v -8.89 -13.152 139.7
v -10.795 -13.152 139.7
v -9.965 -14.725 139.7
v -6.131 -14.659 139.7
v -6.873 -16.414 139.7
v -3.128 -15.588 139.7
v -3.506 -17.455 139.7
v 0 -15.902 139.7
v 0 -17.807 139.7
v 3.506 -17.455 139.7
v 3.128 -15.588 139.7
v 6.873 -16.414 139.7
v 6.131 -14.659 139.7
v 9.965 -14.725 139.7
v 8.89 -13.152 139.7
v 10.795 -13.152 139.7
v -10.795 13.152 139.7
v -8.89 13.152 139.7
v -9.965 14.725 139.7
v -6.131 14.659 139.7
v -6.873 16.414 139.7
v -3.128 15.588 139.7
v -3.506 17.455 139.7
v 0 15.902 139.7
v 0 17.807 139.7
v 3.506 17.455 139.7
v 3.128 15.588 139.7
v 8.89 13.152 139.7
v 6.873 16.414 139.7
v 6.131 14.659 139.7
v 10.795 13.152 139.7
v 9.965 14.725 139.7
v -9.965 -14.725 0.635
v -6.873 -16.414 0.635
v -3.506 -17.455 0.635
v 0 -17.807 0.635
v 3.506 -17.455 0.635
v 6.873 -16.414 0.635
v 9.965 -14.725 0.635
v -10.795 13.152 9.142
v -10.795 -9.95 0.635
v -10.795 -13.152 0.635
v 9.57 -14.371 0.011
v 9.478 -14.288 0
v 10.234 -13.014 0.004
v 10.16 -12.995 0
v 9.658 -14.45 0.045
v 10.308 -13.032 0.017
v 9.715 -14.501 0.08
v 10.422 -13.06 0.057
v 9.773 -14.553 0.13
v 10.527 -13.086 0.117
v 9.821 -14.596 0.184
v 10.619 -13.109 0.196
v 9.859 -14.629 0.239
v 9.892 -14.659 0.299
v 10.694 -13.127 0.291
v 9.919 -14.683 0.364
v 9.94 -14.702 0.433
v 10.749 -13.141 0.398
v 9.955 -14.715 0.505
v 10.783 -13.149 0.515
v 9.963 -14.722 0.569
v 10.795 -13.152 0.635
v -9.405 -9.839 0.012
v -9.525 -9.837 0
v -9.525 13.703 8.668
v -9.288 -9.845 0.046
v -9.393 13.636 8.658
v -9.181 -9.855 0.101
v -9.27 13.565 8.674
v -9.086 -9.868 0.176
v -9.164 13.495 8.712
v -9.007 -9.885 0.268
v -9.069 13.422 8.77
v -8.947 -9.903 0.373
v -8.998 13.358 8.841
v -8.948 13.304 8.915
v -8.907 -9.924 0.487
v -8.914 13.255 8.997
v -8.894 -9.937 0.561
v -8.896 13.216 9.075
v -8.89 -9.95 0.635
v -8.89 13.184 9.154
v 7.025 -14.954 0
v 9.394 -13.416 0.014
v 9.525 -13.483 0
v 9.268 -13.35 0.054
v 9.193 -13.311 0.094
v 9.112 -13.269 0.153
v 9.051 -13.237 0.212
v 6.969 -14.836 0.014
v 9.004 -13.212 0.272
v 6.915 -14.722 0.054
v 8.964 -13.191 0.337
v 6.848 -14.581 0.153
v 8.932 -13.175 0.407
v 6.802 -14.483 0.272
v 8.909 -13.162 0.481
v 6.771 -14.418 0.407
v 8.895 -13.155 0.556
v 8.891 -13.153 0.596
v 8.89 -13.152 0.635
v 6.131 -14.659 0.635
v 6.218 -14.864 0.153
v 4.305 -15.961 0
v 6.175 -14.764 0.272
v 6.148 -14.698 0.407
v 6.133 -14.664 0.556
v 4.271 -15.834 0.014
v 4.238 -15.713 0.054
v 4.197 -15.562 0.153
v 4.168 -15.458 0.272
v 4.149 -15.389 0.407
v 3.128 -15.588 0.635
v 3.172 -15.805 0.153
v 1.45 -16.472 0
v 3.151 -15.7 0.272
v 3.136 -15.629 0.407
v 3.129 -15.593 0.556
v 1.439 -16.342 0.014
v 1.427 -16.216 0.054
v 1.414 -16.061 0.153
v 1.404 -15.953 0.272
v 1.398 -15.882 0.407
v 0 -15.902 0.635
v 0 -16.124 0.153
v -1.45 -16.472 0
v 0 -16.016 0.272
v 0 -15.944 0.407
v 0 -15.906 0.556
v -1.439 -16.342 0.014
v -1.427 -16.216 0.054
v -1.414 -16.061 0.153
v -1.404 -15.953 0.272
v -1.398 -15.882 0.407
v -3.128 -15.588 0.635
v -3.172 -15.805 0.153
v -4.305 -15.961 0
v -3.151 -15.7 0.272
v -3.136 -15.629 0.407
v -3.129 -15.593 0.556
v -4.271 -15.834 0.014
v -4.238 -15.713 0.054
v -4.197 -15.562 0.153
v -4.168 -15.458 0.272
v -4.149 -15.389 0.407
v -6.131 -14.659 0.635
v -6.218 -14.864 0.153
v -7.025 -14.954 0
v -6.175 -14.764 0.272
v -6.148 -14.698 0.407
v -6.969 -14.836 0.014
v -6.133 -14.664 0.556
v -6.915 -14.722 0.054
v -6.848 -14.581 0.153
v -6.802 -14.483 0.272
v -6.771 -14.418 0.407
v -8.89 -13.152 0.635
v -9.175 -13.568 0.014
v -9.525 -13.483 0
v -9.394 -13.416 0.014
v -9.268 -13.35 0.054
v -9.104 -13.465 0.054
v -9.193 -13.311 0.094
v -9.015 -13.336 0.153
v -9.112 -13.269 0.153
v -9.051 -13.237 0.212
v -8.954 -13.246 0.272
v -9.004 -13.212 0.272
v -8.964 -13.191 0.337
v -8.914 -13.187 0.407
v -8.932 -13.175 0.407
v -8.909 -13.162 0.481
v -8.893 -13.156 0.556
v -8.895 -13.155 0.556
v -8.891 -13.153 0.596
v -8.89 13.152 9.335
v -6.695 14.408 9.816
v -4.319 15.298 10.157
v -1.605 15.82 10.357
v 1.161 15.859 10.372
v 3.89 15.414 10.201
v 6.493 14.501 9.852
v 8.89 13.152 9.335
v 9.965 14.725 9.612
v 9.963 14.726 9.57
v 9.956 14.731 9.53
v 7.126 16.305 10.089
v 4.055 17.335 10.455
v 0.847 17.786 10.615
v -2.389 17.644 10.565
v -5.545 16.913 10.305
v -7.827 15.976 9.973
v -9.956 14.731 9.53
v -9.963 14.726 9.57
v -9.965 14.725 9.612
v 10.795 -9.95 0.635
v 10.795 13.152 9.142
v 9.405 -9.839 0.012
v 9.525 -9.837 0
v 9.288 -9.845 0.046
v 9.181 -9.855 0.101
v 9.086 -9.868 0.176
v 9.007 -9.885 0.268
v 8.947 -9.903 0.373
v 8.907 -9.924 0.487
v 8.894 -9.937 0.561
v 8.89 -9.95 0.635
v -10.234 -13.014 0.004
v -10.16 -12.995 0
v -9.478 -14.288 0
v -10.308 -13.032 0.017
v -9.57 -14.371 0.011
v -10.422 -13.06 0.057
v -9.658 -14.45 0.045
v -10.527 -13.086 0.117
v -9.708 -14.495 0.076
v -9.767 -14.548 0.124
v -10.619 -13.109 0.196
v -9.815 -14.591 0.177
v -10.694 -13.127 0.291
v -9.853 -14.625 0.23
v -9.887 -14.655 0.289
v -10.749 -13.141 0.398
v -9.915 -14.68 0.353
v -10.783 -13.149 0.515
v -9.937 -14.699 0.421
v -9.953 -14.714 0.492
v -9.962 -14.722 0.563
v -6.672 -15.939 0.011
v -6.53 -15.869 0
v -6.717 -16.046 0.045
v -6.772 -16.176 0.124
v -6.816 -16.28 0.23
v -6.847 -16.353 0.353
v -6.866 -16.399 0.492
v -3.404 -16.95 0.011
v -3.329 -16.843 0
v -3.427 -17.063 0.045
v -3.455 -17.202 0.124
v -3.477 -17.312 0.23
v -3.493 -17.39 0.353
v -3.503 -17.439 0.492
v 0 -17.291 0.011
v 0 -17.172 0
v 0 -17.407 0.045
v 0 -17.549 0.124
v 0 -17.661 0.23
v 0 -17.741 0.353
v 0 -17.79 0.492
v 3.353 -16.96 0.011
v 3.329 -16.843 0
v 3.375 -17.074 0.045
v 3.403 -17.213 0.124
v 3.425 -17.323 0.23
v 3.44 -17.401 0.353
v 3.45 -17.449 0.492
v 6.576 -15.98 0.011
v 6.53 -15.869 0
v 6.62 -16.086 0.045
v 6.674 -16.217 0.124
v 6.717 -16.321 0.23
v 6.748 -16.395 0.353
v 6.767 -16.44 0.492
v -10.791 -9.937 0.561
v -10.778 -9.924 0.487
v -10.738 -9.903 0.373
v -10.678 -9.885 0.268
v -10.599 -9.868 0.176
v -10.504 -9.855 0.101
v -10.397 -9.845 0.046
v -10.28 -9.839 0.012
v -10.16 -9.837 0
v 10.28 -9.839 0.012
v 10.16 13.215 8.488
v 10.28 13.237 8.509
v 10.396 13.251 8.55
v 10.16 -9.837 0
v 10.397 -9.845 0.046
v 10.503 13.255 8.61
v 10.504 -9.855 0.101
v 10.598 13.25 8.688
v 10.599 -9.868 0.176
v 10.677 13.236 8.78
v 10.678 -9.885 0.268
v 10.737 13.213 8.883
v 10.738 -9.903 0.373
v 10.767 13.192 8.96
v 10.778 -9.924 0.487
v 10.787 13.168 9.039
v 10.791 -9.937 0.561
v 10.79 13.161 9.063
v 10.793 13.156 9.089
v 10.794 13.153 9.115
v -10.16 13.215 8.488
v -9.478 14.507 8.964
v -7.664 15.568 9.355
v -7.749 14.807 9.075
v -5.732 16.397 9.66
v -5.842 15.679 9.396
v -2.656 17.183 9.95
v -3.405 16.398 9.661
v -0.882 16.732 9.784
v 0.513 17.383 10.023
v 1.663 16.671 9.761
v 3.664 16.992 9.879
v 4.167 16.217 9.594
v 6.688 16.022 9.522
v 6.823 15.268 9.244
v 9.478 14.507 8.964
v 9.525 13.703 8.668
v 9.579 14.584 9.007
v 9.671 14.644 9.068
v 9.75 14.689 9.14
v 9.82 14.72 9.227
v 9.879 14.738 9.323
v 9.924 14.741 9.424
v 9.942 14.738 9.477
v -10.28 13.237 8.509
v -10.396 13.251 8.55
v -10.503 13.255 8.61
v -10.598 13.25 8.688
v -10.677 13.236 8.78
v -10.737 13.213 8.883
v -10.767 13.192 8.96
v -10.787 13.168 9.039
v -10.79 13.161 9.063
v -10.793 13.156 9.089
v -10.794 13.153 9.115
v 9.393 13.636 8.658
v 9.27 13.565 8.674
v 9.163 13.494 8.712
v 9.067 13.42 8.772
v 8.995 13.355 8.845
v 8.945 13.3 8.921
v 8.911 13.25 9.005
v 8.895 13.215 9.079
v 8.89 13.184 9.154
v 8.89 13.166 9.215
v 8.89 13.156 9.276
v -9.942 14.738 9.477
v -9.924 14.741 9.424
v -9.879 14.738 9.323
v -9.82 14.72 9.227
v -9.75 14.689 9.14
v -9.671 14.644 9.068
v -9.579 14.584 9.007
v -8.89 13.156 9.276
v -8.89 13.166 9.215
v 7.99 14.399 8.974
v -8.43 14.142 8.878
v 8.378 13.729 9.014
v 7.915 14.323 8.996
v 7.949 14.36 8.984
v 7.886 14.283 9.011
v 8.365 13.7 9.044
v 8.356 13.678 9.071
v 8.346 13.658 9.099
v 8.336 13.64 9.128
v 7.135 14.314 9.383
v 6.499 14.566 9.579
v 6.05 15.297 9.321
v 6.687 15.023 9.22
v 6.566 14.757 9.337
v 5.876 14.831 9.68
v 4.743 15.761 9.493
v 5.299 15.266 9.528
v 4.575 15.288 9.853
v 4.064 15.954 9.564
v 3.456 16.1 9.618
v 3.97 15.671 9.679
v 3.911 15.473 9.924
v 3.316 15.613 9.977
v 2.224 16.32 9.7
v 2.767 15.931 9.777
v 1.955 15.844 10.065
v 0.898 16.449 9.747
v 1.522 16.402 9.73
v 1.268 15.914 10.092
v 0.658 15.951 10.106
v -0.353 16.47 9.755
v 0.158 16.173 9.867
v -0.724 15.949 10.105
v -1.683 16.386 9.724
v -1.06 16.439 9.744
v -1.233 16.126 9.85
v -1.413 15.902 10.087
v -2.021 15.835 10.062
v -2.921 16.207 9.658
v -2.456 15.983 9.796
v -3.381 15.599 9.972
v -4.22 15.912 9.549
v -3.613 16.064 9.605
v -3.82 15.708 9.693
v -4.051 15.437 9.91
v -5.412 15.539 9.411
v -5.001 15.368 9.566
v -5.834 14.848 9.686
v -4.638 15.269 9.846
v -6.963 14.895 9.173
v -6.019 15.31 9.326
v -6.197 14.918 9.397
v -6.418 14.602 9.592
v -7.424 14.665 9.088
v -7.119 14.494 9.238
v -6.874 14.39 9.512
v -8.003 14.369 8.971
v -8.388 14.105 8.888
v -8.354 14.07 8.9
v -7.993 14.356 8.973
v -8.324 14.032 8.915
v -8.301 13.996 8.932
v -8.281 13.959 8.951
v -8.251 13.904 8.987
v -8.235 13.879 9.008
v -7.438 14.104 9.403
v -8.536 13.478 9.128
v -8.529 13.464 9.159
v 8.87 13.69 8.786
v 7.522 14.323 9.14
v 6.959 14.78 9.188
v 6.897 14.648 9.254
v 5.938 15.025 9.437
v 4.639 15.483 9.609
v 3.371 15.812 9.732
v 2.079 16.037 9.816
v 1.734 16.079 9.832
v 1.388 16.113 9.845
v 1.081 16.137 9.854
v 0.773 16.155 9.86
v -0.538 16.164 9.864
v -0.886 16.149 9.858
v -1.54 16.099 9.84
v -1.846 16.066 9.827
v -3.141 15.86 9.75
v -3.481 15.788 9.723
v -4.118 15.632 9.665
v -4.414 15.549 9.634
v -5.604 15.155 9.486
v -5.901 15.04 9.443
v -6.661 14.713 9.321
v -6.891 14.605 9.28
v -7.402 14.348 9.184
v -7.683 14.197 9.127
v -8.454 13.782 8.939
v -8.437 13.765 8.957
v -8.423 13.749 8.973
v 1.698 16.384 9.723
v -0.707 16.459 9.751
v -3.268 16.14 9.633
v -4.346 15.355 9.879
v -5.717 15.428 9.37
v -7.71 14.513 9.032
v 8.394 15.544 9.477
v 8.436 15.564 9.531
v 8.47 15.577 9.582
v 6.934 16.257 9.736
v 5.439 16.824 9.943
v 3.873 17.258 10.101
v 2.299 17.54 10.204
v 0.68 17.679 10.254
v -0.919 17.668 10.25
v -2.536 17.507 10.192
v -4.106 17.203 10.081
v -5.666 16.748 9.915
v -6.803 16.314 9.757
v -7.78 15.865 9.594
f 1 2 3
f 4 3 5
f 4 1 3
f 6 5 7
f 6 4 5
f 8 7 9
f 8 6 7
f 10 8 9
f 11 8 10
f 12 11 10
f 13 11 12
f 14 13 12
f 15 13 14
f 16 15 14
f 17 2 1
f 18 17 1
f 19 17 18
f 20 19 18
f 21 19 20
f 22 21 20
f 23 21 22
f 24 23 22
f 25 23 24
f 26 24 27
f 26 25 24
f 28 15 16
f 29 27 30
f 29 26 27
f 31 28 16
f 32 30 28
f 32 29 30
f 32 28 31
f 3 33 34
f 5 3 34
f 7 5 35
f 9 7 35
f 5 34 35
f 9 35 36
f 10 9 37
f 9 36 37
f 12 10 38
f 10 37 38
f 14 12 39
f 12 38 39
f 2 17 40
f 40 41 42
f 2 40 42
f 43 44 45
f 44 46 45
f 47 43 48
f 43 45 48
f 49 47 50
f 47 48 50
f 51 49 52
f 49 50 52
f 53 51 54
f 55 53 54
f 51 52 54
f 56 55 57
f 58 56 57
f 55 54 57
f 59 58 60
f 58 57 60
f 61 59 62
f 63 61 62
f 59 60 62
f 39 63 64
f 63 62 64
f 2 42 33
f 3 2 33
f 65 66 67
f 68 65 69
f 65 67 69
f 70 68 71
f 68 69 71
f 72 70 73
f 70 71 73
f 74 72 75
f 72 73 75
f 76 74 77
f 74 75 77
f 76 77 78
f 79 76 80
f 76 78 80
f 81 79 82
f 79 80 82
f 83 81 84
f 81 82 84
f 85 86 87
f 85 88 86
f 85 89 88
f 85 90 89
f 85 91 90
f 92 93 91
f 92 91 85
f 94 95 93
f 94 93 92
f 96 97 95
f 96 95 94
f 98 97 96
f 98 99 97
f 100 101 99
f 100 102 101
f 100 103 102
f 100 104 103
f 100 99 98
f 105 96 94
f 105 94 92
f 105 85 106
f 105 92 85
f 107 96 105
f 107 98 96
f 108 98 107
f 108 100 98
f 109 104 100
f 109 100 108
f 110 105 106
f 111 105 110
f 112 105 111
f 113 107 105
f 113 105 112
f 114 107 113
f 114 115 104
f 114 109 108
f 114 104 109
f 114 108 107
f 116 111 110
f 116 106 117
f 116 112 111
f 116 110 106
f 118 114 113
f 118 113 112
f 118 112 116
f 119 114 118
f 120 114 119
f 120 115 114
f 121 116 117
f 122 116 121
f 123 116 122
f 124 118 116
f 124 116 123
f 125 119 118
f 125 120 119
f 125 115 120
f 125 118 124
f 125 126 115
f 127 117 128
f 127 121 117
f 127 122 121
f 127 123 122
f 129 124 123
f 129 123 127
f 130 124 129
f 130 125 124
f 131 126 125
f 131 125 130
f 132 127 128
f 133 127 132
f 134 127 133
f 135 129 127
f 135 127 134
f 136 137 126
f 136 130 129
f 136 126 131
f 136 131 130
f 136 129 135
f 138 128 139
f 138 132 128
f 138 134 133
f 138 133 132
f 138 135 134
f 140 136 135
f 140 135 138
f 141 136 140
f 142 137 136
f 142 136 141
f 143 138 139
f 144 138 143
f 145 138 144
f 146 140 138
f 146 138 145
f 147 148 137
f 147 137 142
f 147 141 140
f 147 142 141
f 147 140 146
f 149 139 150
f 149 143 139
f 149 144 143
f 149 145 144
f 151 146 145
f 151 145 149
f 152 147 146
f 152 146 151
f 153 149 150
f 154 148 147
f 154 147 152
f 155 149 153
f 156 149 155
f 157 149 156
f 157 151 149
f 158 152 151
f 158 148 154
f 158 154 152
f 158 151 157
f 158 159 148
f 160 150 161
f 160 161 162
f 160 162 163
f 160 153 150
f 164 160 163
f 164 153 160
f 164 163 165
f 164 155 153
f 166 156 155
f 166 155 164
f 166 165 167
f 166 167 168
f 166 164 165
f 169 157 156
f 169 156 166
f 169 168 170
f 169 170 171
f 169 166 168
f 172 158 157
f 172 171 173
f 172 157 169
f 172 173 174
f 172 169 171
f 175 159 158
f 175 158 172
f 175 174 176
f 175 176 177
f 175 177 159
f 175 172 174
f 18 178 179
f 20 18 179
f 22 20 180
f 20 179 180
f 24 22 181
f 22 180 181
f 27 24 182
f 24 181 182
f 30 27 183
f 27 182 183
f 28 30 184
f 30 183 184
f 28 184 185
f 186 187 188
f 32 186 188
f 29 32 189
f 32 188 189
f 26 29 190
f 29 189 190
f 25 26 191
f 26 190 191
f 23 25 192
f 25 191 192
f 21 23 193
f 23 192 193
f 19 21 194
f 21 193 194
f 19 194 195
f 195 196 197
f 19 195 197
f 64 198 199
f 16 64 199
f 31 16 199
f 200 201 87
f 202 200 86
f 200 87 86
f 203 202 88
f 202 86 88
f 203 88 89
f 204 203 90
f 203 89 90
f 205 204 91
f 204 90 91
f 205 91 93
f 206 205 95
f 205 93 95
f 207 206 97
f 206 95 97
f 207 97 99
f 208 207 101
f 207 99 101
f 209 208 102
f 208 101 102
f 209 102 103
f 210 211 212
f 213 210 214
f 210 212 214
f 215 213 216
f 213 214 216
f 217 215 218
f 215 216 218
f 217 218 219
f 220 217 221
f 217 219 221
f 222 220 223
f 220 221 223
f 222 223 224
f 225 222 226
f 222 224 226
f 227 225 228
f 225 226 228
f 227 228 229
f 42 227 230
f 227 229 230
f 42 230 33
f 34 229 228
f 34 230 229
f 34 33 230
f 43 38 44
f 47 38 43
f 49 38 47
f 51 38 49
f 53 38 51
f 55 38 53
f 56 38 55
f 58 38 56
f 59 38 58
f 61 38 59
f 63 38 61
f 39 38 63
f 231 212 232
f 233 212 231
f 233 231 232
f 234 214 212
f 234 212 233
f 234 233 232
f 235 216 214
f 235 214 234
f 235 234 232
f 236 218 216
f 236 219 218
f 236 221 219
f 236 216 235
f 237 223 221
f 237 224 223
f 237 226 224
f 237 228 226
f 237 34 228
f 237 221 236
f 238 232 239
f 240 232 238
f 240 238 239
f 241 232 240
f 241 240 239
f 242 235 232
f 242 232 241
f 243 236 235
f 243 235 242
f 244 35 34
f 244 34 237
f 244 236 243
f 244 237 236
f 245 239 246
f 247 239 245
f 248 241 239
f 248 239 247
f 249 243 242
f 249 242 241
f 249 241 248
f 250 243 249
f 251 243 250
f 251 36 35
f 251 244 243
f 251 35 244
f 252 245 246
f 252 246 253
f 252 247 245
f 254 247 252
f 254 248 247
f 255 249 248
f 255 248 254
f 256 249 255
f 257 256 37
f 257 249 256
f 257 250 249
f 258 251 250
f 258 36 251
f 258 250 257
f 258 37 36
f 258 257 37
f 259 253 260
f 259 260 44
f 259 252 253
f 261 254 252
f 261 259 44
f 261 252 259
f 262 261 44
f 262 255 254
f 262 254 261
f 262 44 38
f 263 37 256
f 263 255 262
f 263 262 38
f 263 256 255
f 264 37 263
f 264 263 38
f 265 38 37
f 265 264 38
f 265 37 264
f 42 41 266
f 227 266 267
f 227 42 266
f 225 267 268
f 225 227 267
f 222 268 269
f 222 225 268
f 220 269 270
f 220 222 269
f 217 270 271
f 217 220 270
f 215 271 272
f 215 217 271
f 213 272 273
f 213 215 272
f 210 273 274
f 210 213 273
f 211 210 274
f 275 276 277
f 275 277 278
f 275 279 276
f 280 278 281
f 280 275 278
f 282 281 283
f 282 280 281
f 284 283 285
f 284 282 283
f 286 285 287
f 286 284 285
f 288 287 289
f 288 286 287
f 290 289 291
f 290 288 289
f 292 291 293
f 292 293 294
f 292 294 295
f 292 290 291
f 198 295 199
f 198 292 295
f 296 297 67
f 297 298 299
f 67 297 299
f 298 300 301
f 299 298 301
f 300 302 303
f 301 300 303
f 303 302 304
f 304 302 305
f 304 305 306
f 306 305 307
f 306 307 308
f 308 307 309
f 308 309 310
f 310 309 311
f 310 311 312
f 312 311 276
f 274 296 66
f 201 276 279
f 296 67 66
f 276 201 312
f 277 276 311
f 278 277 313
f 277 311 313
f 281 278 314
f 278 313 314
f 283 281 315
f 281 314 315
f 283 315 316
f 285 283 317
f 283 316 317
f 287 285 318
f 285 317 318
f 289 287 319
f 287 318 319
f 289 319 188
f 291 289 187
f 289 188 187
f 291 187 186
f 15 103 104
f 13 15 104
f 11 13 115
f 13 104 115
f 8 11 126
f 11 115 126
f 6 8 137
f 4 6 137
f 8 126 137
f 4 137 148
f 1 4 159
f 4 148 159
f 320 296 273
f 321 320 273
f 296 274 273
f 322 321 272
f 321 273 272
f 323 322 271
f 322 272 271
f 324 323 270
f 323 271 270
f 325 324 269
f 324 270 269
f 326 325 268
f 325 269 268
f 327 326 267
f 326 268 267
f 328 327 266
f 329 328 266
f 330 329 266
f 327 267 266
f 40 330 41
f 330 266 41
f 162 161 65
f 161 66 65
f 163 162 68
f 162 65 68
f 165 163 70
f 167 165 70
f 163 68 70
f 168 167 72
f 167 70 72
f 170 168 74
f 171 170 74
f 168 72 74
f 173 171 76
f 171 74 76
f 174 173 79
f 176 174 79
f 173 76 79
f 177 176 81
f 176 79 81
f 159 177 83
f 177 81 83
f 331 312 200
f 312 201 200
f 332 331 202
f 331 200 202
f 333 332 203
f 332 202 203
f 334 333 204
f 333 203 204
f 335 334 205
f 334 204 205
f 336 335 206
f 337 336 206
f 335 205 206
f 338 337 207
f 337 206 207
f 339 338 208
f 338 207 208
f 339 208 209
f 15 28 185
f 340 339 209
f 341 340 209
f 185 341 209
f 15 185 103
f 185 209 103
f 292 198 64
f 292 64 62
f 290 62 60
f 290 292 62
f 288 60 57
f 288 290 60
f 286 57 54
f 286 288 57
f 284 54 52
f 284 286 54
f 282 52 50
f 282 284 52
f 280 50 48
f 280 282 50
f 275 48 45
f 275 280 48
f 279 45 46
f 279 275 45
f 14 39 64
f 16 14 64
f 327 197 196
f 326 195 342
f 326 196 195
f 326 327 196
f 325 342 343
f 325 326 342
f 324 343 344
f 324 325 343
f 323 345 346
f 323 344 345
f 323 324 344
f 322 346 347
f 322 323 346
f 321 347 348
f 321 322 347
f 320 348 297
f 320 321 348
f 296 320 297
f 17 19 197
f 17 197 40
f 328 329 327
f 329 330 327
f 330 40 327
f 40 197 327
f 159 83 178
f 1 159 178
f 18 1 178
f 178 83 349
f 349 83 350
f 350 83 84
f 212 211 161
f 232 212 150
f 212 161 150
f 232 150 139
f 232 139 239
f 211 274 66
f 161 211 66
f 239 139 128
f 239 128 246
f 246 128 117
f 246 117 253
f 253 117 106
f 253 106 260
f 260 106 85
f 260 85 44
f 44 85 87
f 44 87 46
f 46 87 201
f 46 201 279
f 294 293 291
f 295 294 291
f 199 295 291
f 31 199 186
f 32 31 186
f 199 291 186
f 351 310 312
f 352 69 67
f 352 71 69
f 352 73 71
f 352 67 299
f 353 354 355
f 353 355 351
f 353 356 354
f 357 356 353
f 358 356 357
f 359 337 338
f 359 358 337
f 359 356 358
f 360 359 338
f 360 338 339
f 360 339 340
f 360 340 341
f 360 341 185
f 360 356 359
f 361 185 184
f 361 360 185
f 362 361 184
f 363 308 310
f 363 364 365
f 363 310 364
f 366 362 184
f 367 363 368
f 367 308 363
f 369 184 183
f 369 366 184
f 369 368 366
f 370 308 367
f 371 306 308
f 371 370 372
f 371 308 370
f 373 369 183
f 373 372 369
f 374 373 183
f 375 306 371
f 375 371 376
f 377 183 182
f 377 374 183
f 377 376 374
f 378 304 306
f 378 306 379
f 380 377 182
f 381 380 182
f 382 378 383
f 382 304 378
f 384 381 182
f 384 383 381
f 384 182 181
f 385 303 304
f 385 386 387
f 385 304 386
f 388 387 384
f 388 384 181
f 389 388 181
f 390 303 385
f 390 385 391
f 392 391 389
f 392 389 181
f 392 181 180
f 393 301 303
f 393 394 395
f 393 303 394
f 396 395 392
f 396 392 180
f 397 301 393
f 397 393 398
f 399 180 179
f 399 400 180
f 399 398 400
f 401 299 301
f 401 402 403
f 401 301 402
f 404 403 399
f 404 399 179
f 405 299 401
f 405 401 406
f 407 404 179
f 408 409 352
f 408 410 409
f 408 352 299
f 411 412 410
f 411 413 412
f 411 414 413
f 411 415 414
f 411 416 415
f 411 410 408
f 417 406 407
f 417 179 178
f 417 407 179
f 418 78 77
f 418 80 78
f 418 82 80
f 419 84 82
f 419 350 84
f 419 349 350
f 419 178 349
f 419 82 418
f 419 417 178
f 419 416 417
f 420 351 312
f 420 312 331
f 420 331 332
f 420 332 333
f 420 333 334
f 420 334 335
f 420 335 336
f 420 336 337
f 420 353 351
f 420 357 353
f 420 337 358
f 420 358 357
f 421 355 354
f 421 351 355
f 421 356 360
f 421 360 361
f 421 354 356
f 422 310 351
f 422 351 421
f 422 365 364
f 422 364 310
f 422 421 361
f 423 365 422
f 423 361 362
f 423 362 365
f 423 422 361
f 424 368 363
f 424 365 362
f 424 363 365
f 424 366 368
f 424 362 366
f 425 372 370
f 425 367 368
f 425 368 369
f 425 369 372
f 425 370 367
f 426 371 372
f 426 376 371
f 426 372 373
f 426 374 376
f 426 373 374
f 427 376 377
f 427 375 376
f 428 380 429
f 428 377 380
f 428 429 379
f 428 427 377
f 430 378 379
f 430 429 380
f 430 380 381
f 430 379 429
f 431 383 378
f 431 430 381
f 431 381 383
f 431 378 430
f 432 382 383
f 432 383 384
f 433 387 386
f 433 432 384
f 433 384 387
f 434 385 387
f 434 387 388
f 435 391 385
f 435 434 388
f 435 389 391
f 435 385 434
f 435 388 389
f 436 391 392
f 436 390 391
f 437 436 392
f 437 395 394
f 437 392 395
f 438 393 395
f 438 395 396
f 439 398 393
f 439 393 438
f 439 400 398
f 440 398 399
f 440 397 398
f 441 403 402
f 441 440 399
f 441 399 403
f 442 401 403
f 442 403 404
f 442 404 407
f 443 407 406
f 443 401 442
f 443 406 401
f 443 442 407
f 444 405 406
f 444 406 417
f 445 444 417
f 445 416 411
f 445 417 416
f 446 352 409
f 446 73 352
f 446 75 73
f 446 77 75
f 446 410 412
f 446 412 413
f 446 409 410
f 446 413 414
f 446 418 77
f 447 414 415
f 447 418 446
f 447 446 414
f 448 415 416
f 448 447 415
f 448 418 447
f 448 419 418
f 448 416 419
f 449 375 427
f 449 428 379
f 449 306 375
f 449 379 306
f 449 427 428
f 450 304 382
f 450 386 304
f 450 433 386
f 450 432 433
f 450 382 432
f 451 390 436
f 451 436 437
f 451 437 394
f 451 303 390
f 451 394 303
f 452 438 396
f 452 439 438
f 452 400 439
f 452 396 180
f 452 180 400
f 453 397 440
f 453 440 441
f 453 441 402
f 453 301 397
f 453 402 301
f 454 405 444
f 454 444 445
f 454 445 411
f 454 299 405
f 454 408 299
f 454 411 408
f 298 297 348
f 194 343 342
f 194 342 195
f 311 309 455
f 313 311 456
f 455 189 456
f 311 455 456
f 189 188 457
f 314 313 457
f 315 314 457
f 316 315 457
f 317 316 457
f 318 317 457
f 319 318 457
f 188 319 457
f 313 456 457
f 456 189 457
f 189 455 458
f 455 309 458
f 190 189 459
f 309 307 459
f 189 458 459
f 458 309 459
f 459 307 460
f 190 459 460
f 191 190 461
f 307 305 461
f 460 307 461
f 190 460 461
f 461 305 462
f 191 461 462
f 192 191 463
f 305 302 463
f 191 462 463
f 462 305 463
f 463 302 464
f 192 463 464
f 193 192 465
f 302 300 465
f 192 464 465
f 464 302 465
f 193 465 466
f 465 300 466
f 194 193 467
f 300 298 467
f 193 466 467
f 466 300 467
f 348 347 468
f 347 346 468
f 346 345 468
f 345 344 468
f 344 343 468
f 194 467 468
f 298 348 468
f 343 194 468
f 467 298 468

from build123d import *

# Parameters (mm, degrees)
F1_DEPTH = 139.7
F3_DEPTH = 10.795
F4_R     = 0.635


with BuildPart() as f1:
    # F0 (on Top) → F1 (new body)
    with BuildSketch(Plane.XY):
        with BuildLine():
            Line((-9.965403, 14.724749), (-10.795, 13.15232))
            Line((-10.795, 13.15232), (-10.795, -13.15232))
            Line((-10.795, -13.15232), (-9.965403, -14.724749))
            ThreePointArc((-9.965403, -14.724749), (0, -17.806574), (9.965403, -14.724749))
            Line((9.965403, -14.724749), (10.795, -13.15232))
            Line((10.795, -13.15232), (10.795, 13.15232))
            Line((10.795, 13.15232), (9.965403, 14.724749))
            ThreePointArc((9.965403, 14.724749), (0, 17.806574), (-9.965403, 14.724749))
        make_face()
        with BuildLine():
            Line((-8.89, -13.15232), (-8.89, 13.15232))
            ThreePointArc((-8.89, 13.15232), (0, 15.901574), (8.89, 13.15232))
            Line((8.89, 13.15232), (8.89, -13.15232))
            ThreePointArc((8.89, -13.15232), (0, -15.901574), (-8.89, -13.15232))
        make_face(mode=Mode.SUBTRACT)
    extrude(amount=F1_DEPTH)

    # F2 (on Right) → F3 (cut, symmetric)
    with BuildSketch(Plane.YZ):
        Polygon((24.65296, 12.700437), (-9.836838, 0), (0, 0), (24.65296, 0), align=None)
    extrude(amount=F3_DEPTH, both=True, mode=Mode.SUBTRACT)

    # F4
    f4_edges = [f1.edges().sort_by_distance(p)[0] for p in [
        (10.795, 1.657741, 4.232735),
        (0, 17.806574, 10.179341),
        (0, 15.901574, 9.477848),
        (8.89, 1.657741, 4.232735),
        (-10.795, 1.657741, 4.232735),
        (10.380202, 13.938535, 8.754984),
        (-10.380202, 13.938535, 8.754984),
        (-10.795, -11.494579, 0),
        (-10.380202, -13.938535, 0),
        (0, -17.806574, 0),
        (0, -15.901574, 0),
        (8.89, -11.494579, 0),
        (10.795, -11.494579, 0),
        (10.380202, -13.938535, 0),
        (-8.89, -11.494579, 0),
        (-8.89, 1.657741, 4.232735),
    ]]
    fillet(f4_edges, radius=F4_R)


solid = f1.part
